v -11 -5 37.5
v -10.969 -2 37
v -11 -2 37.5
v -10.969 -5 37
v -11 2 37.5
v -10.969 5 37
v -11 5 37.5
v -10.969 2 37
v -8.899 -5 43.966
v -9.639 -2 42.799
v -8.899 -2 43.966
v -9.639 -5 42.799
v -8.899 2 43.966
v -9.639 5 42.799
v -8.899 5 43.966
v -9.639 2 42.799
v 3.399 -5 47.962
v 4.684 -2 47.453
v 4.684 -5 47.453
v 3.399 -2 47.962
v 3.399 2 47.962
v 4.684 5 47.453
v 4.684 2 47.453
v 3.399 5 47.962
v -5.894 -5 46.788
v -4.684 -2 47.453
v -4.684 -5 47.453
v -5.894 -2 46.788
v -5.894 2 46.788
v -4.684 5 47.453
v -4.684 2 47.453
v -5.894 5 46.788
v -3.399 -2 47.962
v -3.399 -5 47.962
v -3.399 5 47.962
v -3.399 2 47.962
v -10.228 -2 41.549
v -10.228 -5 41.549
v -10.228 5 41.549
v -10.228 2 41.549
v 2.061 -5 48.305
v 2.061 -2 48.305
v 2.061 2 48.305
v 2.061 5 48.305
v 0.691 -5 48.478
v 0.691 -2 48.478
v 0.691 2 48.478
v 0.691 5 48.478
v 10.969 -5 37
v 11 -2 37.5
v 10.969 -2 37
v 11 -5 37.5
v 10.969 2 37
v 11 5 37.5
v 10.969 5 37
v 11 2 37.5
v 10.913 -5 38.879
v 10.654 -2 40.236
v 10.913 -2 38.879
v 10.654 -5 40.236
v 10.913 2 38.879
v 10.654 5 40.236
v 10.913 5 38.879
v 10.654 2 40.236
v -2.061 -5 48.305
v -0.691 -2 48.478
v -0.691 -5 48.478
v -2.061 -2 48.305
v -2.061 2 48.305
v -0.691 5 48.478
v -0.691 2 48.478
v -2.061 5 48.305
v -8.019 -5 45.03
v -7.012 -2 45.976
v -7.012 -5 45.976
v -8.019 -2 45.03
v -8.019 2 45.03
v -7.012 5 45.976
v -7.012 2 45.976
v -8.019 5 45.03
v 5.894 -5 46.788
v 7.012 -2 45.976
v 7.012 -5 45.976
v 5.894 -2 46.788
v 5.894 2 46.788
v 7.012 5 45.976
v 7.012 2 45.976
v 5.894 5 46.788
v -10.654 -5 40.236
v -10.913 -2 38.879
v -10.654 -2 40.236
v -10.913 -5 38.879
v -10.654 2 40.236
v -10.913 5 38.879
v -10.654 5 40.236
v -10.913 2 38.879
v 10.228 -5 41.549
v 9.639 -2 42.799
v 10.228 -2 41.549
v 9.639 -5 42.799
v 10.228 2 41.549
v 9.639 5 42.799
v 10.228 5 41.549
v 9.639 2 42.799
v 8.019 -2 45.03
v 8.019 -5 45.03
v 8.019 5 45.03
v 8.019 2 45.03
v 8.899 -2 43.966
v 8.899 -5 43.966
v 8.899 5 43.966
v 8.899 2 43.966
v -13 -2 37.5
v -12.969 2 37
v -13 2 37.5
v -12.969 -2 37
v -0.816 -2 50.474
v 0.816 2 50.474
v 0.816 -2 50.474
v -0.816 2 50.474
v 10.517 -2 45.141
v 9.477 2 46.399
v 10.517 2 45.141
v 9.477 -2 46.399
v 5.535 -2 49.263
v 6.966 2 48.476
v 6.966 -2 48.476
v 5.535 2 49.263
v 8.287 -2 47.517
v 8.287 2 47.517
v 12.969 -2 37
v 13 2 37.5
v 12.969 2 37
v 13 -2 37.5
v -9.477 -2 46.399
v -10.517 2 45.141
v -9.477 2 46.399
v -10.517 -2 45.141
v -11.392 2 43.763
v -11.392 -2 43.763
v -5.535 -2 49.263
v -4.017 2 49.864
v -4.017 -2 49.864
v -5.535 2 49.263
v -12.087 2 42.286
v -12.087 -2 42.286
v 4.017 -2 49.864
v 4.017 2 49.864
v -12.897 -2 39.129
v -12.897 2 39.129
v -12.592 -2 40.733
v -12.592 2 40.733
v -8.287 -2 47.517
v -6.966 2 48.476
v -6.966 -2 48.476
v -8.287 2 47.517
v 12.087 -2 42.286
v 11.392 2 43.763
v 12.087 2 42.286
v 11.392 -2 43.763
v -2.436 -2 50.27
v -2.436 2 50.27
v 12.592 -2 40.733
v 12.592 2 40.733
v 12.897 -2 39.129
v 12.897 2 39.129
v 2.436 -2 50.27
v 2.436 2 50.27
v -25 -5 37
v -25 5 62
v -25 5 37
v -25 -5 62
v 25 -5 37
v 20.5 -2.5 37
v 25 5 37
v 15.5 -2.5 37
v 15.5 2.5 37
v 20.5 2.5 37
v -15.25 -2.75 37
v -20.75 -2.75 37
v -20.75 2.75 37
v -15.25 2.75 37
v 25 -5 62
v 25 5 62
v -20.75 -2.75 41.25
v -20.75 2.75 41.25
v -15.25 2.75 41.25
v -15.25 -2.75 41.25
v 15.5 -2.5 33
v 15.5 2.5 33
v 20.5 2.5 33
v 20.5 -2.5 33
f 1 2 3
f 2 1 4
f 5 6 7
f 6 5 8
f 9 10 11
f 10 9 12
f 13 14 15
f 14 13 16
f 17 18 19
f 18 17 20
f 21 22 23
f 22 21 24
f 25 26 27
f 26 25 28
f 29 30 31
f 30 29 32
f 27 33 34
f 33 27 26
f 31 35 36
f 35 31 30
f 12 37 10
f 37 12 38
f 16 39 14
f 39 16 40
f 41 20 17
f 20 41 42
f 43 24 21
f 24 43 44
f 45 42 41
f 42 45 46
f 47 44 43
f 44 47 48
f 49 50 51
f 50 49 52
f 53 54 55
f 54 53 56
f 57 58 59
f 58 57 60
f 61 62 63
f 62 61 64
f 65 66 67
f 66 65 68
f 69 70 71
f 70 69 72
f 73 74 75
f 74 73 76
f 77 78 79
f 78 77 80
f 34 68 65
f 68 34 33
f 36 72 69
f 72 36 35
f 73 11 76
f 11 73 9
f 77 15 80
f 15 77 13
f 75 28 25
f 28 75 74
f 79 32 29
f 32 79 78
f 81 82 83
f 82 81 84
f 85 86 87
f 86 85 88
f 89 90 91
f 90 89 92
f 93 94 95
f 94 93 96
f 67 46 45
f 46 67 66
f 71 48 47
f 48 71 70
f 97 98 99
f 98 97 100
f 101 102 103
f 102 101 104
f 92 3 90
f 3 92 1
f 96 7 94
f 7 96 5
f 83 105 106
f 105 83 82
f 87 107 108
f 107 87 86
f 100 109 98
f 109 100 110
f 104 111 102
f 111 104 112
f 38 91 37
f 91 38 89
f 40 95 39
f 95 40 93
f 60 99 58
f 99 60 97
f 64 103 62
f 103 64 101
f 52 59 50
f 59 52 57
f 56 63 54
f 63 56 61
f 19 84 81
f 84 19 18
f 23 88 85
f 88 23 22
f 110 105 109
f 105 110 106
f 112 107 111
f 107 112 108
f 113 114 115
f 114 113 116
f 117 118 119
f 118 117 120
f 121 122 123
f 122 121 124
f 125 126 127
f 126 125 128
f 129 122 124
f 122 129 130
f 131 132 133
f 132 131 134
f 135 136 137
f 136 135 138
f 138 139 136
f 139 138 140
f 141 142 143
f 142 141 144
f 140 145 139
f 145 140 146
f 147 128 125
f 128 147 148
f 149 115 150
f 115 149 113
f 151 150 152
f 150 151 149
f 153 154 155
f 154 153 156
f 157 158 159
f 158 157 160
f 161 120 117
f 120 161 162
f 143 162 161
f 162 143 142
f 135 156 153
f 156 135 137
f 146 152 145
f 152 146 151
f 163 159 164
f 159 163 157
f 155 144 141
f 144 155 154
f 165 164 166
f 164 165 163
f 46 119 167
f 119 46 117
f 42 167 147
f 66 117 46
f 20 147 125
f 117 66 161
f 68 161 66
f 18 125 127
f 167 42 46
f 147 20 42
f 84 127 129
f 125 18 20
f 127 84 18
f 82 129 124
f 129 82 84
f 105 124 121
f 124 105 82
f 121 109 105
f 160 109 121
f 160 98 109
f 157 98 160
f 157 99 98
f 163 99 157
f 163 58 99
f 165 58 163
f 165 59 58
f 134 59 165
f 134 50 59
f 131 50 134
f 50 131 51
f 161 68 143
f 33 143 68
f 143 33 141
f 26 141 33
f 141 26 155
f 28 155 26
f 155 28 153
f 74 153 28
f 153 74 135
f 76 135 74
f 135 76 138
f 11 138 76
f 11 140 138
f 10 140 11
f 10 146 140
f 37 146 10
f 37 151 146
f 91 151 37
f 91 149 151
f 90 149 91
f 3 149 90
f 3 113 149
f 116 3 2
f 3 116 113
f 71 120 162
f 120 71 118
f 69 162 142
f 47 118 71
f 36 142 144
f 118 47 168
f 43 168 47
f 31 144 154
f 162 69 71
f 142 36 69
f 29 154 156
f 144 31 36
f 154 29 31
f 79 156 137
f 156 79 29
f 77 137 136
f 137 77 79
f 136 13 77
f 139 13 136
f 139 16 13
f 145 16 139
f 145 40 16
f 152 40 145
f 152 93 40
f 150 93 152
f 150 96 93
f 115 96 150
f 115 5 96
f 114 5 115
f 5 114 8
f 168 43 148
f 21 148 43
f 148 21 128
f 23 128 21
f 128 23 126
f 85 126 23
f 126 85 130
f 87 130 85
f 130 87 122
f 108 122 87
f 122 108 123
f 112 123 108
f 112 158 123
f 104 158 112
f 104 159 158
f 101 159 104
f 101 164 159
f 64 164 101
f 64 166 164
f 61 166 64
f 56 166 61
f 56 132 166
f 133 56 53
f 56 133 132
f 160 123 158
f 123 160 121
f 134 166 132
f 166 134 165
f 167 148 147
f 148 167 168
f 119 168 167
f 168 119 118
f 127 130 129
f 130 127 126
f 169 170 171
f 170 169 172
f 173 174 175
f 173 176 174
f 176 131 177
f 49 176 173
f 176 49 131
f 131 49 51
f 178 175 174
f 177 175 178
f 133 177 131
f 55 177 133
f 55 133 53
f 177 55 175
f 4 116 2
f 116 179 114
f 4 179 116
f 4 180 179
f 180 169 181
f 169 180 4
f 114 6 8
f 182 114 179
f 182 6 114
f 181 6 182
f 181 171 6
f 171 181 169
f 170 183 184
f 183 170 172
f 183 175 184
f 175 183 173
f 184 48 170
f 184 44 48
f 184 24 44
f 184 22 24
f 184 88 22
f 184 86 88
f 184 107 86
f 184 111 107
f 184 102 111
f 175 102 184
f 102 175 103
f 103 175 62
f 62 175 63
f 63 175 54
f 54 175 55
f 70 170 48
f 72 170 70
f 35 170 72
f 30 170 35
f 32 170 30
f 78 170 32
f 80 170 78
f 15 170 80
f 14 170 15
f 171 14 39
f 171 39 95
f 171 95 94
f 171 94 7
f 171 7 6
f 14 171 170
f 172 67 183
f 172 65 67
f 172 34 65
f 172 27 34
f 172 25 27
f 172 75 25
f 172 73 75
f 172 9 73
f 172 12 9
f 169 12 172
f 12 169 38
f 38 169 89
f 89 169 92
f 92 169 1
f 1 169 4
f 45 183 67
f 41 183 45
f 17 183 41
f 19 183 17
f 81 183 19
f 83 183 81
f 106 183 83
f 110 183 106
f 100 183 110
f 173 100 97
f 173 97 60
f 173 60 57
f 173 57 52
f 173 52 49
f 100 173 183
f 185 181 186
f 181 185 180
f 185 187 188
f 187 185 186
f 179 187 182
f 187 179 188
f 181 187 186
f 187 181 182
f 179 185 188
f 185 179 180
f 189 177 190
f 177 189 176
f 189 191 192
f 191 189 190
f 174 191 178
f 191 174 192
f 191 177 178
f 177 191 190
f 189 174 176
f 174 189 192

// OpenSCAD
module base(){
	difference(){
		union(){
			cube(size=[50,40,4],center=true);
			translate([0,0,-2]) cylinder(r=22,h=4,$fn=50,center=true);
			translate([0,-20,23]) cube(size=[50,4,50],center=true);
			translate([16,-20,0]) cube(size=[4,15,25]);
			translate([-20,-20,0]) cube(size=[4,15,25]);
		}
		cylinder(r=10.5,h=9,$fn=50,center=true);

		translate([0,-20,8]) rotate([90,0,0]) cylinder(r=3,h=6,$fn=50,center=true);	
		translate([20,-20,42]) rotate([90,0,0]) cylinder(r=3,h=6,$fn=50,center=true);	
		translate([-20,-20,42]) rotate([90,0,0]) cylinder(r=3,h=6,$fn=50,center=true);	
	}
}

module collimatingMirrorMount(){
	difference(){
		translate([0,-30,23]) cube(size=[50,10,50],center=true);
		translate([0,-30,8]) rotate([90,0,0]) cylinder(r=3,h=12,$fn=50,center=true);	
		translate([20,-30,42]) rotate([90,0,0]) cylinder(r=3,h=12,$fn=50,center=true);	
		translate([-20,-30,42]) rotate([90,0,0]) cylinder(r=3,h=12,$fn=50,center=true);	
		translate([0,-33,28]) rotate([90,0,0]) color([0.5,0.7,0.2]) cylinder(r=11,h=5,$fn=50,center=true);
	}
}

module FocusingMirrorMount(){
	difference(){
		translate([0,-30,23]) cube(size=[50,10,50],center=true);
		translate([0,-30,8]) rotate([90,0,0]) cylinder(r=3,h=12,$fn=50,center=true);	
		translate([20,-30,42]) rotate([90,0,0]) cylinder(r=3,h=12,$fn=50,center=true);	
		translate([-20,-30,42]) rotate([90,0,0]) cylinder(r=3,h=12,$fn=50,center=true);	
	}
	translate([0,-40,23]) cube(size=[20,10,20],center=true);
	difference(){
		translate([0,-45,28]) cube(size=[60,10,60],center=true);
		translate([0,-48,28]) rotate([90,0,0]) color([0.5,0.7,0.2]) cylinder(r=26,h=5,$fn=50,center=true);
		translate([0,-45,8]) rotate([90,0,0]) cylinder(r=8,h=12,$fn=50,center=true);	
		translate([20,-45,42]) rotate([90,0,0]) cylinder(r=8,h=12,$fn=50,center=true);	
		translate([-20,-45,42]) rotate([90,0,0]) cylinder(r=8,h=12,$fn=50,center=true);	
	}
}

module gratingMount(){
	difference(){
		translate([0,-30,23]) cube(size=[50,10,50],center=true);
		translate([0,-30,8]) rotate([90,0,0]) cylinder(r=3,h=12,$fn=50,center=true);	
		translate([20,-30,42]) rotate([90,0,0]) cylinder(r=3,h=12,$fn=50,center=true);	
		translate([-20,-30,42]) rotate([90,0,0]) cylinder(r=3,h=12,$fn=50,center=true);	
		translate([0,-33,28]) cube(size=[26,5,26],center=true);
	}
}

module detectorMount(){
	union(){
		difference(){
			translate([0,-30,24]) cube(size=[60,10,53],center=true);
			translate([2,-30,45]) cube(size=[20,15,20],center=true);
			translate([0,-30,8]) rotate([90,0,0]) cylinder(r=3,h=12,$fn=50,center=true);	
			translate([20,-30,42]) rotate([90,0,0]) cylinder(r=3,h=12,$fn=50,center=true);	
			translate([-20,-30,42]) rotate([90,0,0]) cylinder(r=3,h=12,$fn=50,center=true);	
			translate([0,-36,8]) rotate([90,0,0]) cylinder(r=7.5,h=12,$fn=50,center=true);	
			translate([20,-36,42]) rotate([90,0,0]) cylinder(r=7.5,h=12,$fn=50,center=true);	
			translate([-20,-36,42]) rotate([90,0,0]) cylinder(r=7.5,h=12,$fn=50,center=true);	
		}
		difference(){
			union(){
				translate([-32,-33.5,25]) rotate([90,0,0]) color([0.5,0.7,0.2]) cube(size=[5,50,3],center=true);
				translate([32,-33.5,25]) rotate([90,0,0]) color([0.5,0.7,0.2]) cube(size=[5,50,3],center=true);	
				translate([0,-33.5,-1.5]) rotate([90,0,0]) color([0.5,0.7,0.2]) cube(size=[75,3,17],center=true);	
				translate([-36,-37,24.5]) rotate([90,0,0]) color([0.5,0.7,0.2]) cube(size=[3,53,10],center=true);
				translate([36,-37,24.5]) rotate([90,0,0]) color([0.5,0.7,0.2]) cube(size=[3,53,10],center=true);
			}
			translate([0,-38.5,25]) rotate([90,0,0]) color([1,0.4,0.2]) cube(size=[72,52.3,2.5],center=true);
		}
	}
}

module lightMountRear(){
	difference(){
		union(){
			cube(size=[50,40,4],center=true);
			translate([0,0,-2]) cylinder(r=22,h=4,$fn=50,center=true);
			difference(){
				translate([0,-20,10.5]) cube(size=[50,10,25],center=true);
				translate([0,-20,22.5]) rotate([90,0,0]) cylinder(r=11.5,h=12,$fn=50,center=true);
				translate([18,-20,21.5]) cube(size=[5.5,5.5,5.5],center=true);
			}
		}
		cylinder(r=10.5,h=9,$fn=50,center=true);
	}
	translate([-18,-20,24.5]) cube(size=[5,5,5],center=true);
}

module lightMountFront(){
	difference(){
		translate([0,19,20]) cube(size=[50,2,40],center=true);
		translate([0,19,20]) cube(size=[5,3,30],center=true);
		translate([9.25,20,19.5]) rotate([90,0,0]) cylinder(r=1.5,h=5,$fn=50,center=true);
		translate([-9.25,20,19.5]) rotate([90,0,0]) cylinder(r=1.5,h=5,$fn=50,center=true);
	}
	translate([20,12,12]) cube(size=[4,15,25],center=true);
	translate([-20,12,12]) cube(size=[4,15,25],center=true);
	difference(){
		union(){
			cube(size=[50,40,4],center=true);
			difference(){
				translate([0,0,-2]) cylinder(r=22,h=4,$fn=50,center=true);
				translate([0,22,-2]) cube(size=[20,4,5],center=true);
			}
			difference(){
				translate([0,-20,10.5]) cube(size=[50,10,25],center=true);
				translate([0,-20,22.5]) rotate([90,0,0]) cylinder(r=11.5,h=12,$fn=50,center=true);
				translate([18,-20,21.5]) cube(size=[5.5,5.5,5.5],center=true);
			}
		}
		cylinder(r=10.5,h=9,$fn=50,center=true);
	}
	translate([-18,-20,24.5]) cube(size=[5,5,5],center=true);
}

module lightMountFrontWithLens(){
	difference(){
		translate([0,50,25]) cube(size=[50,2,50],center=true);
		translate([0,50,25]) cube(size=[5,3,30],center=true);
		translate([9.25,50,25]) rotate([90,0,0]) cylinder(r=1.5,h=5,$fn=50,center=true);
		translate([-9.25,50,25]) rotate([90,0,0]) cylinder(r=1.5,h=5,$fn=50,center=true);
	}
	translate([20,42,12]) cube(size=[4,15,25],center=true);
	translate([-20,42,12]) cube(size=[4,15,25],center=true);
	difference(){
		union(){
			translate([0,0,0]) cube(size=[50,102,4],center=true);
			difference(){
				translate([0,0,-2]) cylinder(r=22,h=4,$fn=50,center=true);
				translate([0,22,-2]) cube(size=[20,4,5],center=true);
			}
			difference(){
				translate([0,-50,10.5]) cube(size=[50,10,25],center=true);
				translate([0,-50,22.5]) rotate([90,0,0]) cylinder(r=11.5,h=12,$fn=50,center=true);
				translate([18,-50,21.5]) cube(size=[5.5,5.5,5.5],center=true);
			}
		}
		cylinder(r=10.5,h=9,$fn=50,center=true);
	}
	translate([-18,-50,24.5]) cube(size=[5,5,5],center=true);
	translate([-18,-0,24.5]) cube(size=[5,5,5],center=true);
			difference(){
				translate([0,0,10.5]) cube(size=[50,10,25],center=true);
		cylinder(r=10.5,h=9,$fn=50,center=true);
				union(){
					translate([0,0,22.5]) rotate([90,0,0]) cylinder(r=11,h=12,$fn=50,center=true);
					translate([0,0,22.5]) rotate([90,0,0]) cylinder(r=13,h=4,$fn=50,center=true);
				}
				translate([18,0,21.5]) cube(size=[5.5,5.5,5.5],center=true);
			}
}

module lightMountTop(){
		translate([0,-20,0]){
			difference(){
				translate([0,-20,10.5]) cube(size=[50,10,25],center=true);
				translate([0,-20,22.5]) rotate([90,0,0]) cylinder(r=11.5,h=12,$fn=50,center=true);
				translate([18,-20,21.5]) cube(size=[5.5,5.5,5.5],center=true);
			}
			translate([-18,-20,24.5]) cube(size=[5,5,5],center=true);
		}
}

module lightMountTopLens(){
		translate([0,0,0]){
			difference(){
				translate([0,0,10.5]) cube(size=[50,10,25],center=true);
				union(){
					translate([0,0,22.5]) rotate([90,0,0]) cylinder(r=11,h=12,$fn=50,center=true);
					translate([0,0,22.5]) rotate([90,0,0]) cylinder(r=13,h=4,$fn=50,center=true);
				}
				translate([18,0,21.5]) cube(size=[5.5,5.5,5.5],center=true);
			}
			translate([-18,0,24.5]) cube(size=[5,5,5],center=true);
		}
}

module rotator(){
	translate([0,0,-10]) cube(size=[80,10,4],center=true);
	translate([-5,-10,-10]) rotate([0,0,50]) cube(size=[110,10,4],center=true);
	translate([5,-10,-10]) rotate([0,0,-50]) cube(size=[110,10,4],center=true);
	translate([0,0,-5]) cylinder(r=10,h=12,$fn=50,center=true);
	translate([0,0,-10]) cylinder(r=30,h=4,$fn=50,center=true);
}

//base();
//rotator();
//lightMountFront();
//lightMountFrontWithLens();
//lightMountRear();
//translate([0,20,60]) rotate([180,0,180]) lightMountTop();
translate([0,0,60]) rotate([180,0,180]) lightMountTopLens();
//collimatingMirrorMount();
//FocusingMirrorMount();
//gratingMount();
//detectorMount();
